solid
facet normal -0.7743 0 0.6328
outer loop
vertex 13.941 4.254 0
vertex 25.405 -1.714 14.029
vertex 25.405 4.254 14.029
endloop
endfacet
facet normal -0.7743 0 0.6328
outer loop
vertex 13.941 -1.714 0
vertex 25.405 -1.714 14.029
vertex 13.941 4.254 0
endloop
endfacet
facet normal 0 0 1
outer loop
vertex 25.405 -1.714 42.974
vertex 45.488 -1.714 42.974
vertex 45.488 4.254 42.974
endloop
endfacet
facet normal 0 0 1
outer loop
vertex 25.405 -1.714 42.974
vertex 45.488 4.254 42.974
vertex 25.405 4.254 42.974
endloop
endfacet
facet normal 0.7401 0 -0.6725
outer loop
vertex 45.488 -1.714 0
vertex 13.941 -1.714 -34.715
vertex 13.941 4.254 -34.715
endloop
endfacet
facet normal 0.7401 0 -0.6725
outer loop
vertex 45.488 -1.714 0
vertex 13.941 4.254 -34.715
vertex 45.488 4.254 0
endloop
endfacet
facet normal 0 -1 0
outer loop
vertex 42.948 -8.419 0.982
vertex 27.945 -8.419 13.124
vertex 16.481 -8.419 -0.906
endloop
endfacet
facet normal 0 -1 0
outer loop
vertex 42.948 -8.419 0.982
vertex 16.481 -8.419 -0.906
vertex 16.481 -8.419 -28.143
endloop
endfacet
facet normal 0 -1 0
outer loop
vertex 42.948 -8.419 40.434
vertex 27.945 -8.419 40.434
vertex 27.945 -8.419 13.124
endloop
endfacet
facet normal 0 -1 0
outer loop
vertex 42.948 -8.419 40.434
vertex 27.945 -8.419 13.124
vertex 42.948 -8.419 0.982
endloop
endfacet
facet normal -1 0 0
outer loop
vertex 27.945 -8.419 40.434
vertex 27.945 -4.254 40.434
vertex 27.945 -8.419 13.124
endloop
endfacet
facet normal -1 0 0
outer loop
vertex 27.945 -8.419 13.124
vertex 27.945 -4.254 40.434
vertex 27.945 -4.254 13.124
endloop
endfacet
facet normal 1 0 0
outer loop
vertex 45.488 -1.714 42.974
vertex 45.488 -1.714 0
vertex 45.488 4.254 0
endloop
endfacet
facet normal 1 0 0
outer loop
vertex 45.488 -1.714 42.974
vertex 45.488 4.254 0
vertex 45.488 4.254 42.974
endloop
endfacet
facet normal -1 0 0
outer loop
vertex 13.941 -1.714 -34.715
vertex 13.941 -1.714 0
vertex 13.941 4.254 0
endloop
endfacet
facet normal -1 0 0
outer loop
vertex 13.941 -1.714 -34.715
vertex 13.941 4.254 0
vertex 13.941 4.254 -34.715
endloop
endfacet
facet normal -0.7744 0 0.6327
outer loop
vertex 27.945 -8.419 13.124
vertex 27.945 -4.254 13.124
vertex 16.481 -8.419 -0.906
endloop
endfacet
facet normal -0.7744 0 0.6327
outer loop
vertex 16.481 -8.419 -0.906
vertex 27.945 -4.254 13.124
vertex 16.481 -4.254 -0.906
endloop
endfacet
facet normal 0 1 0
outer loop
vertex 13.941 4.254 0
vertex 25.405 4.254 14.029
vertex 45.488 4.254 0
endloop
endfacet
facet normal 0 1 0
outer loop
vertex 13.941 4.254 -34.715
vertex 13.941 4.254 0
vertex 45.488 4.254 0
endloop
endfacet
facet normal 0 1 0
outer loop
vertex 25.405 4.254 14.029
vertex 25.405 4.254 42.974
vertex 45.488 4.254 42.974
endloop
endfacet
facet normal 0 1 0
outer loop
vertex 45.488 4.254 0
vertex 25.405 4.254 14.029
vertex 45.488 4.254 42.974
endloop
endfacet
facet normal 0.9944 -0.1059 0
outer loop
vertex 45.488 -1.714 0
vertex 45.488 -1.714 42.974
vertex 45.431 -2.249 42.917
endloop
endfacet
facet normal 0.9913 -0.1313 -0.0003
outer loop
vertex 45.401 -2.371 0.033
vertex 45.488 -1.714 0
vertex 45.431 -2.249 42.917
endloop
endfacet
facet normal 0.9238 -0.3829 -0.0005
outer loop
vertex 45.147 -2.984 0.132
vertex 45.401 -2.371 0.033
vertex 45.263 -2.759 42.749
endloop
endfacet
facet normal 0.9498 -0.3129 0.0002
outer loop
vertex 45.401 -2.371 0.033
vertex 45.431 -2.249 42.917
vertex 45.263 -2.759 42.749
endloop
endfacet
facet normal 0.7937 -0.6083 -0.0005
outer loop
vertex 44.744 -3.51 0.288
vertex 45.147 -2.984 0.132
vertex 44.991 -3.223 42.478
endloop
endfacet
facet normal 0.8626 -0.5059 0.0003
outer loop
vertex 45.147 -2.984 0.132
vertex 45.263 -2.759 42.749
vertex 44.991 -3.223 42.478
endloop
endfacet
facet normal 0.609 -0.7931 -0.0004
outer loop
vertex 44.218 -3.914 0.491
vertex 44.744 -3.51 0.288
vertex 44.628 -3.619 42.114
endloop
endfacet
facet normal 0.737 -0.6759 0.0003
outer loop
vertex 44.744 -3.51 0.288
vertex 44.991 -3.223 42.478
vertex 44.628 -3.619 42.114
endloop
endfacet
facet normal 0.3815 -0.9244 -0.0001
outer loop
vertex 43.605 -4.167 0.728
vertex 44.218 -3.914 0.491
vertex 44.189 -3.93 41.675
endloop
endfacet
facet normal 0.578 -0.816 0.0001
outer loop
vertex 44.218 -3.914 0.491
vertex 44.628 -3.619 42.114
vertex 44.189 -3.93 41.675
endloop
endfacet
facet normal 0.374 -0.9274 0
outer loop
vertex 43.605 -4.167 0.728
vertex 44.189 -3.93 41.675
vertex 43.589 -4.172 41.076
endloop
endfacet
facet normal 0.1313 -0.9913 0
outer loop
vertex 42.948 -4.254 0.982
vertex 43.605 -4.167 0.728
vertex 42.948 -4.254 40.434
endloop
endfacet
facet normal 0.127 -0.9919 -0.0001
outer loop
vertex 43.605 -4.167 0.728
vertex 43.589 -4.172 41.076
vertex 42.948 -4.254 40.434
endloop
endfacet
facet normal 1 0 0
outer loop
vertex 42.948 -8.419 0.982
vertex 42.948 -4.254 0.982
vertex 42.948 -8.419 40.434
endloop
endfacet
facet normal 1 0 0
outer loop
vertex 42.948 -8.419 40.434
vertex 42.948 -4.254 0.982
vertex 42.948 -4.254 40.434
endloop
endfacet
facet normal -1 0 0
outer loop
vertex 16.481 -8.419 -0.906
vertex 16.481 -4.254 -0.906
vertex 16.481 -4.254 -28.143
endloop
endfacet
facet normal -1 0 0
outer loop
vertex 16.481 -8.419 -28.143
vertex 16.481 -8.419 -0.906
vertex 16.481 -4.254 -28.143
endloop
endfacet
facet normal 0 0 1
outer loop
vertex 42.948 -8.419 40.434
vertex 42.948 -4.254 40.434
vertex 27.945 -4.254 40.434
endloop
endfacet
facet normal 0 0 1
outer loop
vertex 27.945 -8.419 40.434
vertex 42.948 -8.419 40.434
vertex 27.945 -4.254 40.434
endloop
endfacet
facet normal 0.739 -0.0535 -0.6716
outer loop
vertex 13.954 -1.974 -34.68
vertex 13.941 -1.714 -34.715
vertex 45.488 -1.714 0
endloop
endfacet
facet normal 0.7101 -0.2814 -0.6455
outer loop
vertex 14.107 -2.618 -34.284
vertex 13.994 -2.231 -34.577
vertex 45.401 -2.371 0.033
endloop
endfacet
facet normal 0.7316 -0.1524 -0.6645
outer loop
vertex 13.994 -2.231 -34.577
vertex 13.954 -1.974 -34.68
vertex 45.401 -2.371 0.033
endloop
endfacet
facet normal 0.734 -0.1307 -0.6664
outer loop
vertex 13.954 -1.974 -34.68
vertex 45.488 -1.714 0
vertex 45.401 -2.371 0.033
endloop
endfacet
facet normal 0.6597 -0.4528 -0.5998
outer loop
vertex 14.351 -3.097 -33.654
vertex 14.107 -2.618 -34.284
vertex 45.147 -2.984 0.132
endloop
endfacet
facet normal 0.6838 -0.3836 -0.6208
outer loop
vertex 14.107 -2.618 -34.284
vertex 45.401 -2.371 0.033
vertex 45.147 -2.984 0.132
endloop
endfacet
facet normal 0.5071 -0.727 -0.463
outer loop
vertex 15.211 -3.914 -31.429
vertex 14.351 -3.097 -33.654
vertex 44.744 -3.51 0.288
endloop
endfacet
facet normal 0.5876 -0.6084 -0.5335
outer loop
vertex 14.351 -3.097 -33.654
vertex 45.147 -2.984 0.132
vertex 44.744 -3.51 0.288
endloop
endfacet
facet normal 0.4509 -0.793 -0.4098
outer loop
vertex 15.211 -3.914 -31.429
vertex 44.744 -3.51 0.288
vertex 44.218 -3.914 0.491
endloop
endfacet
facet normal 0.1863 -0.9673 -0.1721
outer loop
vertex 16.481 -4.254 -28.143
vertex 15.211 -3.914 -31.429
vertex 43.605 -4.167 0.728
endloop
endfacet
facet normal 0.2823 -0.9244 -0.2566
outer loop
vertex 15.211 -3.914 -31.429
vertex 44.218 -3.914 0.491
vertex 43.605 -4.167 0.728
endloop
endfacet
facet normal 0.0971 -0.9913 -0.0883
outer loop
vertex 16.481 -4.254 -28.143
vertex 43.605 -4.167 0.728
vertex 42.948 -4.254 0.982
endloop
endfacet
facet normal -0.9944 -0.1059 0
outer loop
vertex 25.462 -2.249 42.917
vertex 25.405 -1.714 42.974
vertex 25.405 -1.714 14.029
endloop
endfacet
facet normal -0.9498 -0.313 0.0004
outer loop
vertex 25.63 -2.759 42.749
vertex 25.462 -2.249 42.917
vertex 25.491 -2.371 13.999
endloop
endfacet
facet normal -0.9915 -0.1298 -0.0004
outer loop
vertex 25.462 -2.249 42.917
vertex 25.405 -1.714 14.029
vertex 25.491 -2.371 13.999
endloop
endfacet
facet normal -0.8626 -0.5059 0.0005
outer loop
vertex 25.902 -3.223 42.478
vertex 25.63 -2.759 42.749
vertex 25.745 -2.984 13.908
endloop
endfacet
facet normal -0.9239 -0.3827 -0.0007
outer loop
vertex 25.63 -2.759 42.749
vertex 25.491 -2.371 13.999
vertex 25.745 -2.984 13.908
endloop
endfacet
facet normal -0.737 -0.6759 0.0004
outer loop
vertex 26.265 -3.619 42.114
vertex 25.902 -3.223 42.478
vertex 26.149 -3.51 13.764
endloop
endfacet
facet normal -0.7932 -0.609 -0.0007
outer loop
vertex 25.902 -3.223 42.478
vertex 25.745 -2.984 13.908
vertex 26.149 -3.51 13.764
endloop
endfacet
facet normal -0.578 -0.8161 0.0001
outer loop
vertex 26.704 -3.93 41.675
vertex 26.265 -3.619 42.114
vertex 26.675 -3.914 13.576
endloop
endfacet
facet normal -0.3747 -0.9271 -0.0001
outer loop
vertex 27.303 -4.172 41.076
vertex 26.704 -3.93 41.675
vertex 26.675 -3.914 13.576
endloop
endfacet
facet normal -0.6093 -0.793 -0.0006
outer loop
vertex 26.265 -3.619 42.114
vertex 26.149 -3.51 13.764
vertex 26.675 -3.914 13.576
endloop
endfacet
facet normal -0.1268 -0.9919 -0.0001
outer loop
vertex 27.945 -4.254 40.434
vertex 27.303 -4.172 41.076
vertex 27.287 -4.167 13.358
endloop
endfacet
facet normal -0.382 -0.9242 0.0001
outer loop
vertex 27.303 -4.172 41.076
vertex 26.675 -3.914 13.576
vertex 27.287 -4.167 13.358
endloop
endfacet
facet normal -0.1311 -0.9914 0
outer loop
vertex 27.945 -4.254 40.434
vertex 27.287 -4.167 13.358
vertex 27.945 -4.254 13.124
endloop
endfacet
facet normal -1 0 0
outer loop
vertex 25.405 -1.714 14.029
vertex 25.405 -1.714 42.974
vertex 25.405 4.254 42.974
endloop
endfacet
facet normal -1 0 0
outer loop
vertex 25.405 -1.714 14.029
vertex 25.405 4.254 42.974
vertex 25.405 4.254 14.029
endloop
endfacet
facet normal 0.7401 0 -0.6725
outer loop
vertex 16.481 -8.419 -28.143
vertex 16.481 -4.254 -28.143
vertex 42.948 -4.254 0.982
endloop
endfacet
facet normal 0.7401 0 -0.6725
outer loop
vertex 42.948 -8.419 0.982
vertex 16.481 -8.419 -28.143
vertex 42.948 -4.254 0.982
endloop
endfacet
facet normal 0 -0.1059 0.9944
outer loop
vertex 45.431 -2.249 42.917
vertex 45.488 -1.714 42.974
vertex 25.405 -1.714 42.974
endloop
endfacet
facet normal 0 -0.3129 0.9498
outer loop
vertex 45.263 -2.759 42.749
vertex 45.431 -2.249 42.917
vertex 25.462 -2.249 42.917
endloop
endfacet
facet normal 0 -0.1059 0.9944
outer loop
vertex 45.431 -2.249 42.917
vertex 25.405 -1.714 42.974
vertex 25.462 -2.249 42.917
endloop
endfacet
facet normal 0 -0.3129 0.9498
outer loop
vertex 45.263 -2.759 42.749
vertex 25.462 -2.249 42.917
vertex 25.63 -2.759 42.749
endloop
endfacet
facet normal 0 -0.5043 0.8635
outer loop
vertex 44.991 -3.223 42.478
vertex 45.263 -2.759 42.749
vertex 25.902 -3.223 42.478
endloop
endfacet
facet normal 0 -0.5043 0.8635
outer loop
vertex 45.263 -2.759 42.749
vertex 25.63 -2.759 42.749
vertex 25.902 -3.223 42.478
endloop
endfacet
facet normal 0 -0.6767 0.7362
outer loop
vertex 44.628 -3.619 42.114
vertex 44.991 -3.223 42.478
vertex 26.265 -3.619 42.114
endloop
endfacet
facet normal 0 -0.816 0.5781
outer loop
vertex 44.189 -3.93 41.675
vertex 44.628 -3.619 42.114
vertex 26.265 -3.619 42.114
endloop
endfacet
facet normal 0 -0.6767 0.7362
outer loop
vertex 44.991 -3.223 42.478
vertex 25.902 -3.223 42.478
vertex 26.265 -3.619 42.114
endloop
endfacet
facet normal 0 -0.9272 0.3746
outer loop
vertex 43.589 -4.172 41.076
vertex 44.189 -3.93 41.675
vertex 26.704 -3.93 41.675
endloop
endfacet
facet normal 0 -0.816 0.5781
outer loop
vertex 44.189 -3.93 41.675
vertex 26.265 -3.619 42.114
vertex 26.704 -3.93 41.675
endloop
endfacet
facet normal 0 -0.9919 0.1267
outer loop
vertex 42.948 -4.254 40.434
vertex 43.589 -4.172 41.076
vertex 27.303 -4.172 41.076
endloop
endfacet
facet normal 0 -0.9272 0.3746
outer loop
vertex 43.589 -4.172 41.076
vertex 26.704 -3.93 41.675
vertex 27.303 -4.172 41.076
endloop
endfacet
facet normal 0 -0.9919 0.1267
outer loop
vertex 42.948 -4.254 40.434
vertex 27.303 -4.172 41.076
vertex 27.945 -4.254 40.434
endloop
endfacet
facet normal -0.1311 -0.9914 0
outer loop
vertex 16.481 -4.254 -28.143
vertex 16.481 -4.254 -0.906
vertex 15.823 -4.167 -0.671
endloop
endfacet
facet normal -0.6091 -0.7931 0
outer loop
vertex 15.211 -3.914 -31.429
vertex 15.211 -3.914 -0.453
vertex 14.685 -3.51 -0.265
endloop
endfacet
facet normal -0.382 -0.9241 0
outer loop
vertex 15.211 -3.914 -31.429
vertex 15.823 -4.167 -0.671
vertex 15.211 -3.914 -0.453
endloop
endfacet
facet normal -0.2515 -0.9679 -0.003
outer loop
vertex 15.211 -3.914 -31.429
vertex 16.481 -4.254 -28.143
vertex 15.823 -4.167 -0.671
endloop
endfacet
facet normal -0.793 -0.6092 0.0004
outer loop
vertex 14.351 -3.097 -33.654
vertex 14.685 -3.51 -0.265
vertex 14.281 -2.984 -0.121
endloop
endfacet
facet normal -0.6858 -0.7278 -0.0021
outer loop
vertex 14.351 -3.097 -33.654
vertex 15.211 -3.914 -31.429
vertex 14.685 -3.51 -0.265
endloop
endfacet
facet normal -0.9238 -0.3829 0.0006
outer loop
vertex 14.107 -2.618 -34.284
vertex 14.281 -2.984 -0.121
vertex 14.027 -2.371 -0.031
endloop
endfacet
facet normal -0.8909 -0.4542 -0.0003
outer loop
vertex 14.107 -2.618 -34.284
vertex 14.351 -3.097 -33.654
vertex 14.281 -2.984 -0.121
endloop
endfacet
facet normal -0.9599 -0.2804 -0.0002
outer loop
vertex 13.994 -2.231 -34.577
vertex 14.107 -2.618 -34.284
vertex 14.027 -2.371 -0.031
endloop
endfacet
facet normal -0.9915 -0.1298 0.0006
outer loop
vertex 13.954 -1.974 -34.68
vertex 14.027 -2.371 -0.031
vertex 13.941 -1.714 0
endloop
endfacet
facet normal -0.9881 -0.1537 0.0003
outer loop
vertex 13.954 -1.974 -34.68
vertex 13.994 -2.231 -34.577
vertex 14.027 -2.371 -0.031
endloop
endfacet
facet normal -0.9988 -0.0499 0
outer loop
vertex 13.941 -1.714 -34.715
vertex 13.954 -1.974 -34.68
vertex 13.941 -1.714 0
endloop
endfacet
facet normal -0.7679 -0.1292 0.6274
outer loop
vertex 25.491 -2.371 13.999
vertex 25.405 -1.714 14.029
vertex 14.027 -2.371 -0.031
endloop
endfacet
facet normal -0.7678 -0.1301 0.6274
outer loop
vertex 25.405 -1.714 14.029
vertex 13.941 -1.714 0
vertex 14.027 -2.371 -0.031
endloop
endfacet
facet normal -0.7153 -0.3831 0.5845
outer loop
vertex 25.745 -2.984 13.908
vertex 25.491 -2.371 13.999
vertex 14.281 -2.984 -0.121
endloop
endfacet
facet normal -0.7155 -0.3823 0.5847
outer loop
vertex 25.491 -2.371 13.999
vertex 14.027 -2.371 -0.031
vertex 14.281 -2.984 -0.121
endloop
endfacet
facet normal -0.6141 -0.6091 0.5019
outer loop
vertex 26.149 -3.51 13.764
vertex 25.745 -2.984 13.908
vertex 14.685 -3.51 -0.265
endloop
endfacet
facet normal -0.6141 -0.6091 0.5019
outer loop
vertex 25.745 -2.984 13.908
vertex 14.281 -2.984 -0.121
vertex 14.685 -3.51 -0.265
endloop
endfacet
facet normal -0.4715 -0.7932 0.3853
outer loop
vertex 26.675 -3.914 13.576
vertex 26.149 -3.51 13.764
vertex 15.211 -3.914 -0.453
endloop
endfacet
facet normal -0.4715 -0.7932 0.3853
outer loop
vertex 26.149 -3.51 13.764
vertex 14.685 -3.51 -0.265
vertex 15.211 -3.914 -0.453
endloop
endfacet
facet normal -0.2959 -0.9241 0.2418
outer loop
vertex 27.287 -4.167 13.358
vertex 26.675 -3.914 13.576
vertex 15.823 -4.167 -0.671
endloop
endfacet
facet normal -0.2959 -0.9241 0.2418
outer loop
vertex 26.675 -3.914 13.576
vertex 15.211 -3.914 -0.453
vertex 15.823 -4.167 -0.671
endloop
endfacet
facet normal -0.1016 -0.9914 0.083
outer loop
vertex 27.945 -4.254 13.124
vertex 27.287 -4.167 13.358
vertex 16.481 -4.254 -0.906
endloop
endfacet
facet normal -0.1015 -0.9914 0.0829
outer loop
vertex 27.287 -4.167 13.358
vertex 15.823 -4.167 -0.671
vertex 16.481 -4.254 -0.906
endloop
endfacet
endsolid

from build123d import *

# Parameters (mm, degrees)
F1_DEPTH = 4.253926
F2_R     = 2.54
F3_DEPTH = 4.16477


with BuildPart() as f1:
    # F0 (on Front) → F1 (new body, symmetric)
    with BuildSketch(Plane.XZ):
        Polygon((25.404785, 14.029387), (13.940861, 0), (13.940861, -34.714542), (45.487791, 0), (45.487791, 42.974394), (25.404785, 42.974394), align=None)
    extrude(amount=F1_DEPTH, both=True)

    # F2
    f2_edges = [f1.edges().sort_by_distance(p)[0] for p in [
        (19.672823, -4.253926, 7.014694),
        (13.940861, -4.253926, -17.357271),
        (29.714326, -4.253926, -17.357271),
        (45.487791, -4.253926, 21.487197),
        (35.446288, -4.253926, 42.974394),
        (25.404785, -4.253926, 28.501891),
    ]]
    fillet(f2_edges, radius=F2_R)

    # F1_face (on face) → F3 (join)
    with BuildSketch(Plane(origin=(31.070742, -4.253926, 8.875899), x_dir=(1, 0, 0), z_dir=(0, -1, 0))):
        Polygon((-3.125957, 4.247698), (-14.589881, -9.781689), (-14.589881, -37.01865), (11.87705, -7.894188), (11.87705, 31.558495), (-3.125957, 31.558495), align=None)
    extrude(amount=F3_DEPTH)


solid = f1.part
